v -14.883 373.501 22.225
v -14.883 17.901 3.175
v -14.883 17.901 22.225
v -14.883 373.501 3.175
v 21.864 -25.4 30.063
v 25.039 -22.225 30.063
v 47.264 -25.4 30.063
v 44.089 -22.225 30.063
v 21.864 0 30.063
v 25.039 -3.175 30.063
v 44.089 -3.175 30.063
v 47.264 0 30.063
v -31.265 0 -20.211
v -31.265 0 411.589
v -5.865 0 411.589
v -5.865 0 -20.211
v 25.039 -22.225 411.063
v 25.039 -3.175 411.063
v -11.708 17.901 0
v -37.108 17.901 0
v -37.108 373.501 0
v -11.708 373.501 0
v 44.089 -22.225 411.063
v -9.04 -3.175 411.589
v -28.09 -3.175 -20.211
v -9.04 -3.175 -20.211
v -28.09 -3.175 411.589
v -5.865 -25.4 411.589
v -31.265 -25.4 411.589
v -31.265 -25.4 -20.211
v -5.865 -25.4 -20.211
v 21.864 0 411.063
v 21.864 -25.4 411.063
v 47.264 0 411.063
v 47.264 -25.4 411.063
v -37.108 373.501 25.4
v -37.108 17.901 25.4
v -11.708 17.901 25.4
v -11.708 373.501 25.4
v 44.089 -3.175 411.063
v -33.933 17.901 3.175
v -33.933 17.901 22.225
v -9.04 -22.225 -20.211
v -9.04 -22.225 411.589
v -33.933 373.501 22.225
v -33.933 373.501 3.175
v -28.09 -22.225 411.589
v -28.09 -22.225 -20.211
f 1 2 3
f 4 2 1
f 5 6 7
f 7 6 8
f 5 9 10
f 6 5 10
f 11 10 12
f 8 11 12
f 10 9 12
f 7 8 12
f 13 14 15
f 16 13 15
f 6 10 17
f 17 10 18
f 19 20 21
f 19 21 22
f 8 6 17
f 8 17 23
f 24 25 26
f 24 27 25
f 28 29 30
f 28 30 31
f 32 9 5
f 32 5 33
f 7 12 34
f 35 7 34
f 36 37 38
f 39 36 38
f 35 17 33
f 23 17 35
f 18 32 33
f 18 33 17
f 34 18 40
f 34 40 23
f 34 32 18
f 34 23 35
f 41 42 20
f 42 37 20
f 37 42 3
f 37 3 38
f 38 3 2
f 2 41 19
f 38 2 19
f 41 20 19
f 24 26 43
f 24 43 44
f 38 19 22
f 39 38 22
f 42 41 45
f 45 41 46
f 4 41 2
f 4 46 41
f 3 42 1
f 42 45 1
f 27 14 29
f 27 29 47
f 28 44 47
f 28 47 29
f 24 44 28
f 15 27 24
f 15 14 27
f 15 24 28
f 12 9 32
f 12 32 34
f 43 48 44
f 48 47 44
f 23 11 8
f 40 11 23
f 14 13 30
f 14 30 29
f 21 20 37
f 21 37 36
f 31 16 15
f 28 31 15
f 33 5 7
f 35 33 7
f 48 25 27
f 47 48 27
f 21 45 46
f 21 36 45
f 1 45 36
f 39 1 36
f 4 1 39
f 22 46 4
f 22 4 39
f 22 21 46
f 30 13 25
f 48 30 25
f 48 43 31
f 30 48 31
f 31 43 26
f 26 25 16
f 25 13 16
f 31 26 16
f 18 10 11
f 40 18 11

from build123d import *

# Parameters (mm, degrees)
F0_W     = 25.4
F0_H     = 431.8
F1_DEPTH = 25.4
F0_H_2   = 381
F2_T     = -3.175
F2_2_T   = -3.175
F3_W     = 25.4
F3_H     = 355.6
F4_DEPTH = 25.4
F5_T     = -3.175


with BuildPart() as f1:
    # F0 (on Front) → F1 (new body)
    with BuildSketch(Plane.XZ):
        with Locations((-18.5653362423, 195.6893682097)):
            Rectangle(F0_W, F0_H)
    extrude(amount=F1_DEPTH)

    # F2
    f2_openings = [f1.faces().sort_by_distance(p)[0] for p in [
        (-18.565336, -12.7, 411.589368),
        (-18.565336, -12.7, -20.210632),
    ]]
    offset(amount=F2_T, openings=f2_openings)


with BuildPart() as f1b:
    # F0 (on Front) → F1, piece 2 (new body)
    with BuildSketch(Plane.XZ):
        with Locations((34.5637455255, 220.562649399)):
            Rectangle(F0_W, F0_H_2)
    extrude(amount=F1_DEPTH)

    # F2#2
    f2_2_openings = [f1b.faces().sort_by_distance(p)[0] for p in [
        (34.563746, -12.7, 411.062649),
        (34.563746, -12.7, 30.062649),
    ]]
    offset(amount=F2_2_T, openings=f2_2_openings)


with BuildPart() as f4:
    # F3 (on Top) → F4 (new body)
    with BuildSketch(Plane.XY):
        with Locations((-24.4082328863, 195.701378429)):
            Rectangle(F3_W, F3_H)
    extrude(amount=F4_DEPTH)

    # F5
    f5_openings = [f4.faces().sort_by_distance(p)[0] for p in [
        (-24.408233, 373.501378, 12.7),
        (-24.408233, 17.901378, 12.7),
    ]]
    offset(amount=F5_T, openings=f5_openings)


solid = Compound([f1.part, f1b.part, f4.part])
